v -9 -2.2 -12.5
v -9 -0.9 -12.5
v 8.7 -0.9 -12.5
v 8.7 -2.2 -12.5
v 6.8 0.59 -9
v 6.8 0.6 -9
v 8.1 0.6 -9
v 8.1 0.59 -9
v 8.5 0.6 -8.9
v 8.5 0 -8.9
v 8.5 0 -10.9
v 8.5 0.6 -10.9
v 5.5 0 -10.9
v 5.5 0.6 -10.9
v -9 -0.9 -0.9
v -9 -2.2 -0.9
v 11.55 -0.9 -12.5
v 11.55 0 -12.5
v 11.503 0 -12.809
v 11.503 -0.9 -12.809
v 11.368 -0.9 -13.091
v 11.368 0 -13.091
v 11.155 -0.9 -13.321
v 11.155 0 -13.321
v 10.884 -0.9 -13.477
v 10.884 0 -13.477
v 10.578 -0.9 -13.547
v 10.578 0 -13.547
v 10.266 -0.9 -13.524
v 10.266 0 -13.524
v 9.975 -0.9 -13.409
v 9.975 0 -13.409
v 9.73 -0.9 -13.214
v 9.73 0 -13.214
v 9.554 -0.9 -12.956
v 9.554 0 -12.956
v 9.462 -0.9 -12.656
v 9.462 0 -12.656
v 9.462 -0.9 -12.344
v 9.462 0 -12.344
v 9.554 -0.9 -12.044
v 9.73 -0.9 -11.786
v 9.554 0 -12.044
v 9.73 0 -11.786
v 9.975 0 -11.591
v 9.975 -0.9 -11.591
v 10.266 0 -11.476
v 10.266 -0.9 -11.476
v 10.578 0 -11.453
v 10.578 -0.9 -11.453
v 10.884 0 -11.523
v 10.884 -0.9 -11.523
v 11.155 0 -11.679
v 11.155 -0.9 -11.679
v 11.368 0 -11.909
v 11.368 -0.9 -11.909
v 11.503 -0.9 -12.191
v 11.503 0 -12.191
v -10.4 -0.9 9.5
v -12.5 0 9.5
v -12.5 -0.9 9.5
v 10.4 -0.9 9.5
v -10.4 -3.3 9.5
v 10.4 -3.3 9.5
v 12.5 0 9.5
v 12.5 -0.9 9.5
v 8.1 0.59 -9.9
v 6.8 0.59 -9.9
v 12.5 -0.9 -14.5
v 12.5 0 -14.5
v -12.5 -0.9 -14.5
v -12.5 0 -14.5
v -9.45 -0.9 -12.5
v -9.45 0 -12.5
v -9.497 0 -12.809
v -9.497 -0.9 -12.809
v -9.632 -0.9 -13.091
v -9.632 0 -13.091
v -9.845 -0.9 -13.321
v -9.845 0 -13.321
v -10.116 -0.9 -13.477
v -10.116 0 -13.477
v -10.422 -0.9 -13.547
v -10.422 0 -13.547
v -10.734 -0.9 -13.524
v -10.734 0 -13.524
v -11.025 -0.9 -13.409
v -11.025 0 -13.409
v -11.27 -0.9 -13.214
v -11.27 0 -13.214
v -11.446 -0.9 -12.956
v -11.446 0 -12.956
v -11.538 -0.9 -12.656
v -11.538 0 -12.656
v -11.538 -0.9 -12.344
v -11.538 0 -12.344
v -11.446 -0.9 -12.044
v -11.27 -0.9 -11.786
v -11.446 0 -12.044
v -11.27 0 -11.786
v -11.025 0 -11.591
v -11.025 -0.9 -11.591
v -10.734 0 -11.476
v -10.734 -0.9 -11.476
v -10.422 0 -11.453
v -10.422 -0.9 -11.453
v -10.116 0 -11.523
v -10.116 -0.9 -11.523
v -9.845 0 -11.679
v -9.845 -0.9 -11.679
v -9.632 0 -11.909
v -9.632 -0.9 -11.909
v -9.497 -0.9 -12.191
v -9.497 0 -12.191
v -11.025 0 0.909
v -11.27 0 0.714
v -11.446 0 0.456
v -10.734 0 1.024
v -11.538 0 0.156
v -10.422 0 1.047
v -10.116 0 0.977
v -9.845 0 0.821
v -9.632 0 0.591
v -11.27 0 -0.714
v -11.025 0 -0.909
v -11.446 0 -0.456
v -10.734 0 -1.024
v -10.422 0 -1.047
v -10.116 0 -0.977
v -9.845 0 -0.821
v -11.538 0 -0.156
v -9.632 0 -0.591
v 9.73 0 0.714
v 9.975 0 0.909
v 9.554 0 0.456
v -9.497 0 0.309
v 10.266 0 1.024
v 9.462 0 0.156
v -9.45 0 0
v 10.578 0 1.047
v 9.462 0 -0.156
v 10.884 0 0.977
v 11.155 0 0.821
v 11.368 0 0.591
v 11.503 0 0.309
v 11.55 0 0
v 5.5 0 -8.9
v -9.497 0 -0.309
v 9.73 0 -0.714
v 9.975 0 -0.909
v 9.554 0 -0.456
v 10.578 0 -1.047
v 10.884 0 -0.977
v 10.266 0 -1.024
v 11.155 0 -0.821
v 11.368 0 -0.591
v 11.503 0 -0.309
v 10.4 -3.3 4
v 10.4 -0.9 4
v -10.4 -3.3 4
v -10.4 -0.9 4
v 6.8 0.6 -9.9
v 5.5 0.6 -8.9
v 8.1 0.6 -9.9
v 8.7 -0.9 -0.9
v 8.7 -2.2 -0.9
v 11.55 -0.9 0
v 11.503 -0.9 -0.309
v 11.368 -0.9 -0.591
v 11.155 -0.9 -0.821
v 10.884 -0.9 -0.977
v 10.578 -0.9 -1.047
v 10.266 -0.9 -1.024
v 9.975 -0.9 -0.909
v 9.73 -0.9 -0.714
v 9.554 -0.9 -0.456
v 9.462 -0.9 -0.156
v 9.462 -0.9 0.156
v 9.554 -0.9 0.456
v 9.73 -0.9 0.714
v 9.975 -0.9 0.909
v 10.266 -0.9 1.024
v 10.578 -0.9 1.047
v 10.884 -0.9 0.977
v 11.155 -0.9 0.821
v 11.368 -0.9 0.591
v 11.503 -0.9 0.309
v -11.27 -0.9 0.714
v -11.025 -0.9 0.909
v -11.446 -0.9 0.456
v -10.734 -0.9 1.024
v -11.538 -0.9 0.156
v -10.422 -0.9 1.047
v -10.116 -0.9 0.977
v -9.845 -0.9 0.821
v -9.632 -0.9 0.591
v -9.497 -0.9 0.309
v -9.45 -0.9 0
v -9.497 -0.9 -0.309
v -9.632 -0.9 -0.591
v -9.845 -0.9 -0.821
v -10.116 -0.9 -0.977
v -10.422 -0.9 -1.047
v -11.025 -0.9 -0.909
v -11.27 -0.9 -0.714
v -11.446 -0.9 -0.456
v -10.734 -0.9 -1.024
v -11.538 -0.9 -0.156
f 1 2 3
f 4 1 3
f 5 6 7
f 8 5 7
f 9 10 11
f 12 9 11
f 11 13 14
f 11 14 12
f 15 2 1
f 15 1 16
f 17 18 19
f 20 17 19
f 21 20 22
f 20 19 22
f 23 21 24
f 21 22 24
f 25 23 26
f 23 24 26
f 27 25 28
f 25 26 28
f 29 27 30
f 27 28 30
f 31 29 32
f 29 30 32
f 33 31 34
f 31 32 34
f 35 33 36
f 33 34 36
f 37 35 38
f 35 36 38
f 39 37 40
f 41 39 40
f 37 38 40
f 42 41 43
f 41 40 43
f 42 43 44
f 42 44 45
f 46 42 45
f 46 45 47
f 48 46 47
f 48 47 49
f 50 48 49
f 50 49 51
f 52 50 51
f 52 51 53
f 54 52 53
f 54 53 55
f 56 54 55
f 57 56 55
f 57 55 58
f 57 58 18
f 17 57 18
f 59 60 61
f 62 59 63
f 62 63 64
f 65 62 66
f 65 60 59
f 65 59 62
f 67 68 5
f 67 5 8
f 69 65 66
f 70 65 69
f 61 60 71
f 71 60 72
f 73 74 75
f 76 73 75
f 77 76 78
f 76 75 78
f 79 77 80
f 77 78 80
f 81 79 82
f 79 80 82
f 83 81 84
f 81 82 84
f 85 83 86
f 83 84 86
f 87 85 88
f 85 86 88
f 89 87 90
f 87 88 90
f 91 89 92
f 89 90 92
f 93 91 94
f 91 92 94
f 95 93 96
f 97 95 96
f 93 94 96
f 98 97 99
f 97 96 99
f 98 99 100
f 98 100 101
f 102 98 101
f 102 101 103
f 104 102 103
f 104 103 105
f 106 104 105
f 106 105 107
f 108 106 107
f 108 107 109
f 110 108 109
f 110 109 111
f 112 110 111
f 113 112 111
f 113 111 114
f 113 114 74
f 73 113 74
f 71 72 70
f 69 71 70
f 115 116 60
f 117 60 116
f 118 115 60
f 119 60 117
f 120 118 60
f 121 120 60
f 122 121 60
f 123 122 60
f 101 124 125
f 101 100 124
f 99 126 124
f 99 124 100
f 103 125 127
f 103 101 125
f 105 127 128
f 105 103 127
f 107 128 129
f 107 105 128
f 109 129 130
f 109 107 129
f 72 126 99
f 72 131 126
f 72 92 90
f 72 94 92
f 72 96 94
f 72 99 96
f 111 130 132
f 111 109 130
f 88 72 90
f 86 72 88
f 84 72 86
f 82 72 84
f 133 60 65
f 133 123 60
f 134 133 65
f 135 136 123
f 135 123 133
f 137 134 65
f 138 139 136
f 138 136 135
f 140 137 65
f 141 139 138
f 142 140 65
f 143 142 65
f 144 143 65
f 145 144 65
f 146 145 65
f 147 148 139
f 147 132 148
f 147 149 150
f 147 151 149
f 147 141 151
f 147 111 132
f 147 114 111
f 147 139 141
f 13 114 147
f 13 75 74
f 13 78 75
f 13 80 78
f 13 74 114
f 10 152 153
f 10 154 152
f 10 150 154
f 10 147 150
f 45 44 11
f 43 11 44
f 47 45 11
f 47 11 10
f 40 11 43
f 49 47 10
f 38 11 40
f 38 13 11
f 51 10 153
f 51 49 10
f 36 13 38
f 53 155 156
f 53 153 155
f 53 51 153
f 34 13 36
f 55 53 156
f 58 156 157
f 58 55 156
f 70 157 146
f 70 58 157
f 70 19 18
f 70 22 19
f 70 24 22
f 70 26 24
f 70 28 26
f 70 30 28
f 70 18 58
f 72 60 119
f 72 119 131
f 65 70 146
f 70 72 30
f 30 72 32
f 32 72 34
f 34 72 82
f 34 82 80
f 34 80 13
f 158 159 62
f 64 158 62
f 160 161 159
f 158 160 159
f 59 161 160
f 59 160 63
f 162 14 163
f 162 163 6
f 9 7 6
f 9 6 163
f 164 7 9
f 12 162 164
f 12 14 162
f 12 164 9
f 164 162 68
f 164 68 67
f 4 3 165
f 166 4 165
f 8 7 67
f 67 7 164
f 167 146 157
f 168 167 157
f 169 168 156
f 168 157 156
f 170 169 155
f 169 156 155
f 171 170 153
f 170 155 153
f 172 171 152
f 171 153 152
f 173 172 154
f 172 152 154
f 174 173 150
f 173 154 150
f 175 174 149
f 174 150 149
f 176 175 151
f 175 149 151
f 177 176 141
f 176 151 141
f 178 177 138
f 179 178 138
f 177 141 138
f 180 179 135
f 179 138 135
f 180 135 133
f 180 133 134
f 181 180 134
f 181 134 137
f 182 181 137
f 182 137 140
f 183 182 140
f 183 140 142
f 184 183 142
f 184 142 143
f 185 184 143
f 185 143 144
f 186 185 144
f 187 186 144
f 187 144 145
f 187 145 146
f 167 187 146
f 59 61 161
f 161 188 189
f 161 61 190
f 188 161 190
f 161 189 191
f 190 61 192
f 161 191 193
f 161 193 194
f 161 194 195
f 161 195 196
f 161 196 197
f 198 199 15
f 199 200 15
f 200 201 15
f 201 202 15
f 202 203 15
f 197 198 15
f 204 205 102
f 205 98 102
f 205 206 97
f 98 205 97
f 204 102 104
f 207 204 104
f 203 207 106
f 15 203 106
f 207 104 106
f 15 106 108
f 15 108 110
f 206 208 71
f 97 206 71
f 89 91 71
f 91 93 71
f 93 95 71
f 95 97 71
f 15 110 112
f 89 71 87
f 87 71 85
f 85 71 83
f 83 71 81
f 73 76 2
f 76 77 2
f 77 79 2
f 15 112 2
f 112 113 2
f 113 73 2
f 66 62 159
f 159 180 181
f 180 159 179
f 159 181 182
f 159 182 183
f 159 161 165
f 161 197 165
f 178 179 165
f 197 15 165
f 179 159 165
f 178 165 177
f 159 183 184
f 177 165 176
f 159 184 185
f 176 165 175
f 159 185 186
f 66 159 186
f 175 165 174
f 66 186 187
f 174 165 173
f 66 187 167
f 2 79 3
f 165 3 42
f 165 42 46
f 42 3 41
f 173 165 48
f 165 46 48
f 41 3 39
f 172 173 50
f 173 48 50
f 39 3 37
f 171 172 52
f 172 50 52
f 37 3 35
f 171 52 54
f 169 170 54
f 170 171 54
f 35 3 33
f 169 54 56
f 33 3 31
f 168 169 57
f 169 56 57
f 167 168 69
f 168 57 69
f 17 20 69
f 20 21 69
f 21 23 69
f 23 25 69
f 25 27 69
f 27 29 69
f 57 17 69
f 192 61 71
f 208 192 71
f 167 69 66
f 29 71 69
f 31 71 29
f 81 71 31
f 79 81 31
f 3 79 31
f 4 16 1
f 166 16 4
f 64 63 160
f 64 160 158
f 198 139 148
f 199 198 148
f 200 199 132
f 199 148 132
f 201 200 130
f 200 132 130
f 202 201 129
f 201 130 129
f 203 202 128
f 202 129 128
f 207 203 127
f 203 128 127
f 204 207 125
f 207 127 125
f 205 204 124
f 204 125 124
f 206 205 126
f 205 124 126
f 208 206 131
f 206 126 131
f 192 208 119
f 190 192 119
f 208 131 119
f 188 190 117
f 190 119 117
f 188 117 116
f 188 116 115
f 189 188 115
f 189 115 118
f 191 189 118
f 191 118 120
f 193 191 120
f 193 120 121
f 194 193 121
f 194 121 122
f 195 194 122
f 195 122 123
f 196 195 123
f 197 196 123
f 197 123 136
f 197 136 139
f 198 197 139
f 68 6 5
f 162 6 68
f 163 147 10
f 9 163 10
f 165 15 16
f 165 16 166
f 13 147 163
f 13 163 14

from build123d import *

# Parameters (mm, degrees)
SKIZZE1_W                                 = 25
SKIZZE1_H                                 = 24
PCB_DEPTH                                 = 0.9
SKIZZE2_R                                 = 1.05
MOUNTING_HOLES_DEPTH                      = 1.9
SKIZZE3_W                                 = 20.8
SKIZZE3_H                                 = 5.5
CONNECTOR_CLOSED_DEPTH                    = 2.4
SKIZZE4_W                                 = 17.7
SKIZZE4_H                                 = 11.6
COMPONENTS_WORST_CASE_BOUNDARY_BOX_DEPTH  = 1.3
SKIZZE7_W                                 = 3
SKIZZE7_H                                 = 2
COMPONENTS_WORST_CASE_BOUNDARY_BOX2_DEPTH = 0.6
SKIZZE8_W                                 = 1.3
SKIZZE8_H                                 = 0.9
STATUS_LED_DEPTH                          = 0.01


with BuildPart() as part:
    # Skizze1 → PCB (new body)
    with BuildSketch(Plane(origin=(0, 0, 0), x_dir=(1, 0, 0), z_dir=(0, 1, 0))):
        with Locations((0, 2.5)):
            Rectangle(SKIZZE1_W, SKIZZE1_H)
    extrude(amount=-PCB_DEPTH)

    # Skizze2 → Mounting_Holes (cut, through all)
    with BuildSketch(Plane(origin=(0, 0, 0), x_dir=(1, 0, 0), z_dir=(0, 1, 0))):
        with Locations((10.5, 12.5)):
            Circle(SKIZZE2_R)
        with Locations((10.5, 0)):
            Circle(SKIZZE2_R)
        with Locations((-10.5, 0)):
            Circle(SKIZZE2_R)
        with Locations((-10.5, 12.5)):
            Circle(SKIZZE2_R)
    extrude(amount=-MOUNTING_HOLES_DEPTH, mode=Mode.SUBTRACT)

    # Skizze3 → Connector_closed (add)
    with BuildSketch(Plane.XZ.offset(0.9)):
        with Locations((0, 6.75)):
            Rectangle(SKIZZE3_W, SKIZZE3_H)
    extrude(amount=CONNECTOR_CLOSED_DEPTH)

    # Skizze4 → Components_worst-case_Boundary-Box (add)
    with BuildSketch(Plane.XZ.offset(0.9)):
        with Locations((-0.15, -6.7)):
            Rectangle(SKIZZE4_W, SKIZZE4_H)
    extrude(amount=COMPONENTS_WORST_CASE_BOUNDARY_BOX_DEPTH)

    # Skizze7 → Components_worst-case_Boundary-Box2 (add)
    with BuildSketch(Plane(origin=(0, 0, 0), x_dir=(1, 0, 0), z_dir=(0, 1, 0))):
        with Locations((7, 9.9)):
            Rectangle(SKIZZE7_W, SKIZZE7_H)
    extrude(amount=COMPONENTS_WORST_CASE_BOUNDARY_BOX2_DEPTH)

    # Skizze8 → Status_LED (cut)
    with BuildSketch(Plane(origin=(0, 0.6, 0), x_dir=(1, 0, 0), z_dir=(0, 1, 0))):
        with Locations((7.45, 9.45)):
            Rectangle(SKIZZE8_W, SKIZZE8_H)
    extrude(amount=-STATUS_LED_DEPTH, mode=Mode.SUBTRACT)


solid = part.part
